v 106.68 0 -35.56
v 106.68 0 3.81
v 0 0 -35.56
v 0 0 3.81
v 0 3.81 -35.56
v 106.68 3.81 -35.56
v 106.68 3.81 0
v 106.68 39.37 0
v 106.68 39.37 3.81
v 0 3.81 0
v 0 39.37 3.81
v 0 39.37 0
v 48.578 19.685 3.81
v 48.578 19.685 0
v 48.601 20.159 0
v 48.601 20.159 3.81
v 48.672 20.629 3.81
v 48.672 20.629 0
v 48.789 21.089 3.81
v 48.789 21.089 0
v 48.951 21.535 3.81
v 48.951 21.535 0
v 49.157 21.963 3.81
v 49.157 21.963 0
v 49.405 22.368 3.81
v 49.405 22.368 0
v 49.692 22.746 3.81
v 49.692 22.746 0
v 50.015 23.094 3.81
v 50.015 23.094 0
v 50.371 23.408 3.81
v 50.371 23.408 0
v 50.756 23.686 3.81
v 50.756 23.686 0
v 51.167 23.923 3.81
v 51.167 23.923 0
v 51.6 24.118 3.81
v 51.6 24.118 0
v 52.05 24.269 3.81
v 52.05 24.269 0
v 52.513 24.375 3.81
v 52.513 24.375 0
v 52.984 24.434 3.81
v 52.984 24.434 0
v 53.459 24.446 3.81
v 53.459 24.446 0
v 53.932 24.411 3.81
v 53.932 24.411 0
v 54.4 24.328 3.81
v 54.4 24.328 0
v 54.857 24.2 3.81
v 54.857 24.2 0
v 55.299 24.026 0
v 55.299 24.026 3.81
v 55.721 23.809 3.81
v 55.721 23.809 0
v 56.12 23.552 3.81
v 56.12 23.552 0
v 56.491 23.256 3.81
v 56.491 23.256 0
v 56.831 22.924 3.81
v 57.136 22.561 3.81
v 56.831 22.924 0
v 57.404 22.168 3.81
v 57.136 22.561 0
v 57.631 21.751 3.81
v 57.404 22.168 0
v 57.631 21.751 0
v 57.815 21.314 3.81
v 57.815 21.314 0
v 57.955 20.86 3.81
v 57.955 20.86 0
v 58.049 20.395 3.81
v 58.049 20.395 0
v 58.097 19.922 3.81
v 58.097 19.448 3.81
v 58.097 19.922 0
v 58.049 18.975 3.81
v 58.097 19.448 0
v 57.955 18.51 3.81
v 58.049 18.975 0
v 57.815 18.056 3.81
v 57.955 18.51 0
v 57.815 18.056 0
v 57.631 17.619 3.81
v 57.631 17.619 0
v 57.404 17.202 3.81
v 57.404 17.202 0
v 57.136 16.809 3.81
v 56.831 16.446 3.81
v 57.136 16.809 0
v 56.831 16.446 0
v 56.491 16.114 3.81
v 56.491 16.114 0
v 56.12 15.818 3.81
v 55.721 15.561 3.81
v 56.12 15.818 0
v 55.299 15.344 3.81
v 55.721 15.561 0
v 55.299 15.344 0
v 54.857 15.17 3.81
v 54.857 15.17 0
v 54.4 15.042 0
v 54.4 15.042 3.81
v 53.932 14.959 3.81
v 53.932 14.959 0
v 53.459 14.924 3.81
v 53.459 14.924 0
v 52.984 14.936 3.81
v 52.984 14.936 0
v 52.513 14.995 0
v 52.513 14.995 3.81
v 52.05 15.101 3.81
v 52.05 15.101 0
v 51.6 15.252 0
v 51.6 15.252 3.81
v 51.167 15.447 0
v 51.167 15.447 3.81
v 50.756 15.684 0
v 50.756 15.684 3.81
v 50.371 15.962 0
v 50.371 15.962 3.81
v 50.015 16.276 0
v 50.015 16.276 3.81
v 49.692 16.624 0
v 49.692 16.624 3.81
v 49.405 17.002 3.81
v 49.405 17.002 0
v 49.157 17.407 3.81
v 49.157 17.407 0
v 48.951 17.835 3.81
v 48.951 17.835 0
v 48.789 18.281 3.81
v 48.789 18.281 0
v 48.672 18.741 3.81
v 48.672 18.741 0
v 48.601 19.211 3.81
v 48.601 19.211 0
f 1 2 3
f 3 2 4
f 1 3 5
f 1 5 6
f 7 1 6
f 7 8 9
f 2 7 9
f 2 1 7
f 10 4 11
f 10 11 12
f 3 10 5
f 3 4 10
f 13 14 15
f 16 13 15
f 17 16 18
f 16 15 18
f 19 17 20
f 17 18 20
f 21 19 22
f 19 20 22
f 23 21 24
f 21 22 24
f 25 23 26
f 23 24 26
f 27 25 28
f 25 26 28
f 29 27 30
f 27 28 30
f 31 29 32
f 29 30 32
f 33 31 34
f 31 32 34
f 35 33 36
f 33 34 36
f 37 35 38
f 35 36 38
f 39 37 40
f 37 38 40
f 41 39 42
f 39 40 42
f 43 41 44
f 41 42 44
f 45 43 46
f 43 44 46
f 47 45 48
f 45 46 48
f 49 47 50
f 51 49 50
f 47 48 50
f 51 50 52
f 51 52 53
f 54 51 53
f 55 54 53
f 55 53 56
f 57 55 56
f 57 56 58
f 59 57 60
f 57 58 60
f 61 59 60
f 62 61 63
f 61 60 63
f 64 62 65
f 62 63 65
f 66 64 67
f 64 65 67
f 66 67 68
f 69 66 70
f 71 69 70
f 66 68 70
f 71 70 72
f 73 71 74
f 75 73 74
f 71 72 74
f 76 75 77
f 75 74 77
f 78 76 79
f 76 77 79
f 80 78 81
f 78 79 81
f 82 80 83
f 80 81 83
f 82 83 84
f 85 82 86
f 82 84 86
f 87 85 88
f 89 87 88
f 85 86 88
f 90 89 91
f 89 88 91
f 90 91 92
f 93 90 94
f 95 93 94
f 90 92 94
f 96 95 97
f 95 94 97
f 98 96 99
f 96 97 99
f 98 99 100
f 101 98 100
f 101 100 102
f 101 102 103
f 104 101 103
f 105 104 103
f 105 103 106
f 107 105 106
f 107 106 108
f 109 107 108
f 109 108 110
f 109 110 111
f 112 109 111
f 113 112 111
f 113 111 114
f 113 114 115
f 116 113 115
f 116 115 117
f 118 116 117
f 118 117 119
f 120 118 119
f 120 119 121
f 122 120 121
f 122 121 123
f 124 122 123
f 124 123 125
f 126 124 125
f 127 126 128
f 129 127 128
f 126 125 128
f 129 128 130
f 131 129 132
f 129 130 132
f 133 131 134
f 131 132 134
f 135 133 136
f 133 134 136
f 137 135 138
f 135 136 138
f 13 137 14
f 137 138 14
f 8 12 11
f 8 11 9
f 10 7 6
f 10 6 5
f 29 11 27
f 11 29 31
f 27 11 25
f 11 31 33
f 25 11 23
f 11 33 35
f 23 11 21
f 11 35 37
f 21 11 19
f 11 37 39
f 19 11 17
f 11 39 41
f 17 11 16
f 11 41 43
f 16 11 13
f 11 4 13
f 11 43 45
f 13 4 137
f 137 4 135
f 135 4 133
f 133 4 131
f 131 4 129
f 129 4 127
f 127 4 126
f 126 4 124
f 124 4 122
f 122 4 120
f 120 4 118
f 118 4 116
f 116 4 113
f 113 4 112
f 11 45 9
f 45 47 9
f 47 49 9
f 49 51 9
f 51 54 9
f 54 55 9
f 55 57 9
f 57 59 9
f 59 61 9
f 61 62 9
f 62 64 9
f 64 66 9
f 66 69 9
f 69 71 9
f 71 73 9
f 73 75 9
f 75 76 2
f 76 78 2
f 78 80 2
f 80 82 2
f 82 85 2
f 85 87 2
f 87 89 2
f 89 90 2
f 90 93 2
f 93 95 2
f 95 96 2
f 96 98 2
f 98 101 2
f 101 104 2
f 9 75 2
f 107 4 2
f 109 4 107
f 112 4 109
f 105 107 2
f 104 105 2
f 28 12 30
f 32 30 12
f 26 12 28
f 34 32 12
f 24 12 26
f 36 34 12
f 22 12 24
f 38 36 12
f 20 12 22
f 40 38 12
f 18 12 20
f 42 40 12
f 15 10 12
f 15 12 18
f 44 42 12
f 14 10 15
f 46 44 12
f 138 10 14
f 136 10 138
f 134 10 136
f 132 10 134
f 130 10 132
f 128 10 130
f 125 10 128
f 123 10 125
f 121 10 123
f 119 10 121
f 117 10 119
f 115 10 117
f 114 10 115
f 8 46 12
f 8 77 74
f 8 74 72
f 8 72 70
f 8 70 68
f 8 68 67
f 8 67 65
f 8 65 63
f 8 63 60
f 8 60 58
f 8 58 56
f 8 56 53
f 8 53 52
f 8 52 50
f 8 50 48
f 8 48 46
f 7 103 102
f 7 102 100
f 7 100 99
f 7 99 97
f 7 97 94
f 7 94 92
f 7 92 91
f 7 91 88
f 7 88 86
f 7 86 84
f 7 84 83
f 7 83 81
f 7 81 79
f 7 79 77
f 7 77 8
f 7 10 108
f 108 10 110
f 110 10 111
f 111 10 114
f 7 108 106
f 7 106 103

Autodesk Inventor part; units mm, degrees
ref_plane "YZ Plane" through (0, 0, 0) normal (1, 0, 0) x (0, 1, 0)
ref_plane "XZ Plane" through (0, 0, 0) normal (0, 1, 0) x (-1, 0, 0)
ref_plane "XY Plane" through (0, 0, 0) normal (0, 0, 1) x (1, 0, 0)
sketch "Sketch1" plane through (0, 0, 0) normal (0, 1, 0) x (-1, 0, 0)
  line L0 (0, 0) -> (0, -35.56)
  line L1 (0, -35.56) -> (-106.68, -35.56)
  line L2 (-106.68, -35.56) -> (-106.68, 0)
  line L3 (0, 0) -> (0, 3.81)
  line L4 (0, 3.81) -> (-106.68, 3.81)
  line L5 (-106.68, 3.81) -> (-106.68, 0)
  dimension "d0" = 35.56
  dimension "d1" = 106.68
  dimension "d2" = 3.81
extrude "Extrusion1" add sketch "Sketch1" along normal blind 3.81
sketch "Sketch2" plane through (0, 3.81, 0) normal (0, 1, 0) x (1, 0, 0)
  line L0 (0, 35.56) -> (0, -3.81) projected
  line L1 (0, -3.81) -> (0, 0)
  line L2 (0, 0) -> (106.68, 0)
  line L3 (106.68, -3.81) -> (106.68, 35.56) projected
  line L4 (106.68, -3.81) -> (0, -3.81)
extrude "Extrusion2" add sketch "Sketch2" along normal blind 35.56
sketch "Sketch3" plane through (106.68, 3.81, 0) normal (0, 0, -1) x (-1, 0, 0)
  line L0 (106.68, -3.81) -> (106.68, 35.56) projected
  line L1 (106.68, 15.875) -> (0, 15.875)
  line L2 (0, -3.81) -> (0, 35.56) projected
  circle A0 centre (53.34, 15.875) radius 4.7625
  dimension "d10" = 9.525
extrude "Extrusion3" cut sketch "Sketch3" against normal blind 17.4625
properties part number "Flywheel top lift wheel bracket" material "Steel, Alloy"
